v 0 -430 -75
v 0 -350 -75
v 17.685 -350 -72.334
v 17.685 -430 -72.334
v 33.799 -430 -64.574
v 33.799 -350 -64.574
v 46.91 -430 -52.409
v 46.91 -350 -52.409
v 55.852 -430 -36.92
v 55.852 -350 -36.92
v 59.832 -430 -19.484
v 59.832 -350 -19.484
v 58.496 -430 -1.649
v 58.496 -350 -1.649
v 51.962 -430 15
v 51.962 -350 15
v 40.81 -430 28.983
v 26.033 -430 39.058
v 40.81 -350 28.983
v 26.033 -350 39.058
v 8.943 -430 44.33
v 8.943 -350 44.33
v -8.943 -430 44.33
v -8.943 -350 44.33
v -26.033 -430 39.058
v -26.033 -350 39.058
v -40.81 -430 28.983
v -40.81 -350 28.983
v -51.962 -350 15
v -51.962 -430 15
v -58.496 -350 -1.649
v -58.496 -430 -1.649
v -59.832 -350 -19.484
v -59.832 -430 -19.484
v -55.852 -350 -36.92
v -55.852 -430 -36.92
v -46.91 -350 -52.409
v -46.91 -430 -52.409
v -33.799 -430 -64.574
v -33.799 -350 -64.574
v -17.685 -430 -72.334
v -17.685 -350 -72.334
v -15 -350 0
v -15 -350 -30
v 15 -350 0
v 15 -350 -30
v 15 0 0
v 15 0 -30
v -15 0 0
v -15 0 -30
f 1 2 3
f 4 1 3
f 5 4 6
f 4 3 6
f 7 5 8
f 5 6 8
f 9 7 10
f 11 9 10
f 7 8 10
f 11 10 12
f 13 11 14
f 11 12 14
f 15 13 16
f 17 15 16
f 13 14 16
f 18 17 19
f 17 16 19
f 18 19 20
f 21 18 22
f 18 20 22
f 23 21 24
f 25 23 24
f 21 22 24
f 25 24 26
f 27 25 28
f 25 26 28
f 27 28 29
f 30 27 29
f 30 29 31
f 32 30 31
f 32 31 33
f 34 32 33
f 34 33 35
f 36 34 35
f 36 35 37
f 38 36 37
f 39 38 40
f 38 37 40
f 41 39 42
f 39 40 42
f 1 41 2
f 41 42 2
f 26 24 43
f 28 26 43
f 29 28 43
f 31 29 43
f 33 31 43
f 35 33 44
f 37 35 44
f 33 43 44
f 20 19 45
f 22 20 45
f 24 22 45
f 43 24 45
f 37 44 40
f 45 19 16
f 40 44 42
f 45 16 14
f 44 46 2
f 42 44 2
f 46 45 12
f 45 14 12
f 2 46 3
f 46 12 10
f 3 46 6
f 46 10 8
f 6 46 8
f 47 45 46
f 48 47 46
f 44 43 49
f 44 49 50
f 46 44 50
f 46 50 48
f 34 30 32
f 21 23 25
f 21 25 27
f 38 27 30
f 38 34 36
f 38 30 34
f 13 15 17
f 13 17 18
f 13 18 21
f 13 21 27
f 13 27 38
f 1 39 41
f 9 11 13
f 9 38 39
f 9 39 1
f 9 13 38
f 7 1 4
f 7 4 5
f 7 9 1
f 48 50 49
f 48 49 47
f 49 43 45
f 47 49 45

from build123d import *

# Parameters (mm, degrees)
SKETCH1_W           = 30
SKETCH1_H           = 30
BOSS_EXTRUDE1_DEPTH = 350
SKETCH2_R           = 60
BOSS_EXTRUDE2_DEPTH = 80


with BuildPart() as part:
    # Sketch1 → Boss-Extrude1 (new body)
    with BuildSketch(Plane(origin=(0, 0, 0), x_dir=(1, 0, 0), z_dir=(0, 1, 0))):
        with Locations((0, 15)):
            Rectangle(SKETCH1_W, SKETCH1_H)
    extrude(amount=-BOSS_EXTRUDE1_DEPTH)

    # Sketch2 → Boss-Extrude2 (add)
    with BuildSketch(Plane.XZ.offset(350)):
        with Locations(Location((0, -15, 0), (0, 0, 270))):
            Circle(SKETCH2_R)
    extrude(amount=BOSS_EXTRUDE2_DEPTH)


solid = part.part
